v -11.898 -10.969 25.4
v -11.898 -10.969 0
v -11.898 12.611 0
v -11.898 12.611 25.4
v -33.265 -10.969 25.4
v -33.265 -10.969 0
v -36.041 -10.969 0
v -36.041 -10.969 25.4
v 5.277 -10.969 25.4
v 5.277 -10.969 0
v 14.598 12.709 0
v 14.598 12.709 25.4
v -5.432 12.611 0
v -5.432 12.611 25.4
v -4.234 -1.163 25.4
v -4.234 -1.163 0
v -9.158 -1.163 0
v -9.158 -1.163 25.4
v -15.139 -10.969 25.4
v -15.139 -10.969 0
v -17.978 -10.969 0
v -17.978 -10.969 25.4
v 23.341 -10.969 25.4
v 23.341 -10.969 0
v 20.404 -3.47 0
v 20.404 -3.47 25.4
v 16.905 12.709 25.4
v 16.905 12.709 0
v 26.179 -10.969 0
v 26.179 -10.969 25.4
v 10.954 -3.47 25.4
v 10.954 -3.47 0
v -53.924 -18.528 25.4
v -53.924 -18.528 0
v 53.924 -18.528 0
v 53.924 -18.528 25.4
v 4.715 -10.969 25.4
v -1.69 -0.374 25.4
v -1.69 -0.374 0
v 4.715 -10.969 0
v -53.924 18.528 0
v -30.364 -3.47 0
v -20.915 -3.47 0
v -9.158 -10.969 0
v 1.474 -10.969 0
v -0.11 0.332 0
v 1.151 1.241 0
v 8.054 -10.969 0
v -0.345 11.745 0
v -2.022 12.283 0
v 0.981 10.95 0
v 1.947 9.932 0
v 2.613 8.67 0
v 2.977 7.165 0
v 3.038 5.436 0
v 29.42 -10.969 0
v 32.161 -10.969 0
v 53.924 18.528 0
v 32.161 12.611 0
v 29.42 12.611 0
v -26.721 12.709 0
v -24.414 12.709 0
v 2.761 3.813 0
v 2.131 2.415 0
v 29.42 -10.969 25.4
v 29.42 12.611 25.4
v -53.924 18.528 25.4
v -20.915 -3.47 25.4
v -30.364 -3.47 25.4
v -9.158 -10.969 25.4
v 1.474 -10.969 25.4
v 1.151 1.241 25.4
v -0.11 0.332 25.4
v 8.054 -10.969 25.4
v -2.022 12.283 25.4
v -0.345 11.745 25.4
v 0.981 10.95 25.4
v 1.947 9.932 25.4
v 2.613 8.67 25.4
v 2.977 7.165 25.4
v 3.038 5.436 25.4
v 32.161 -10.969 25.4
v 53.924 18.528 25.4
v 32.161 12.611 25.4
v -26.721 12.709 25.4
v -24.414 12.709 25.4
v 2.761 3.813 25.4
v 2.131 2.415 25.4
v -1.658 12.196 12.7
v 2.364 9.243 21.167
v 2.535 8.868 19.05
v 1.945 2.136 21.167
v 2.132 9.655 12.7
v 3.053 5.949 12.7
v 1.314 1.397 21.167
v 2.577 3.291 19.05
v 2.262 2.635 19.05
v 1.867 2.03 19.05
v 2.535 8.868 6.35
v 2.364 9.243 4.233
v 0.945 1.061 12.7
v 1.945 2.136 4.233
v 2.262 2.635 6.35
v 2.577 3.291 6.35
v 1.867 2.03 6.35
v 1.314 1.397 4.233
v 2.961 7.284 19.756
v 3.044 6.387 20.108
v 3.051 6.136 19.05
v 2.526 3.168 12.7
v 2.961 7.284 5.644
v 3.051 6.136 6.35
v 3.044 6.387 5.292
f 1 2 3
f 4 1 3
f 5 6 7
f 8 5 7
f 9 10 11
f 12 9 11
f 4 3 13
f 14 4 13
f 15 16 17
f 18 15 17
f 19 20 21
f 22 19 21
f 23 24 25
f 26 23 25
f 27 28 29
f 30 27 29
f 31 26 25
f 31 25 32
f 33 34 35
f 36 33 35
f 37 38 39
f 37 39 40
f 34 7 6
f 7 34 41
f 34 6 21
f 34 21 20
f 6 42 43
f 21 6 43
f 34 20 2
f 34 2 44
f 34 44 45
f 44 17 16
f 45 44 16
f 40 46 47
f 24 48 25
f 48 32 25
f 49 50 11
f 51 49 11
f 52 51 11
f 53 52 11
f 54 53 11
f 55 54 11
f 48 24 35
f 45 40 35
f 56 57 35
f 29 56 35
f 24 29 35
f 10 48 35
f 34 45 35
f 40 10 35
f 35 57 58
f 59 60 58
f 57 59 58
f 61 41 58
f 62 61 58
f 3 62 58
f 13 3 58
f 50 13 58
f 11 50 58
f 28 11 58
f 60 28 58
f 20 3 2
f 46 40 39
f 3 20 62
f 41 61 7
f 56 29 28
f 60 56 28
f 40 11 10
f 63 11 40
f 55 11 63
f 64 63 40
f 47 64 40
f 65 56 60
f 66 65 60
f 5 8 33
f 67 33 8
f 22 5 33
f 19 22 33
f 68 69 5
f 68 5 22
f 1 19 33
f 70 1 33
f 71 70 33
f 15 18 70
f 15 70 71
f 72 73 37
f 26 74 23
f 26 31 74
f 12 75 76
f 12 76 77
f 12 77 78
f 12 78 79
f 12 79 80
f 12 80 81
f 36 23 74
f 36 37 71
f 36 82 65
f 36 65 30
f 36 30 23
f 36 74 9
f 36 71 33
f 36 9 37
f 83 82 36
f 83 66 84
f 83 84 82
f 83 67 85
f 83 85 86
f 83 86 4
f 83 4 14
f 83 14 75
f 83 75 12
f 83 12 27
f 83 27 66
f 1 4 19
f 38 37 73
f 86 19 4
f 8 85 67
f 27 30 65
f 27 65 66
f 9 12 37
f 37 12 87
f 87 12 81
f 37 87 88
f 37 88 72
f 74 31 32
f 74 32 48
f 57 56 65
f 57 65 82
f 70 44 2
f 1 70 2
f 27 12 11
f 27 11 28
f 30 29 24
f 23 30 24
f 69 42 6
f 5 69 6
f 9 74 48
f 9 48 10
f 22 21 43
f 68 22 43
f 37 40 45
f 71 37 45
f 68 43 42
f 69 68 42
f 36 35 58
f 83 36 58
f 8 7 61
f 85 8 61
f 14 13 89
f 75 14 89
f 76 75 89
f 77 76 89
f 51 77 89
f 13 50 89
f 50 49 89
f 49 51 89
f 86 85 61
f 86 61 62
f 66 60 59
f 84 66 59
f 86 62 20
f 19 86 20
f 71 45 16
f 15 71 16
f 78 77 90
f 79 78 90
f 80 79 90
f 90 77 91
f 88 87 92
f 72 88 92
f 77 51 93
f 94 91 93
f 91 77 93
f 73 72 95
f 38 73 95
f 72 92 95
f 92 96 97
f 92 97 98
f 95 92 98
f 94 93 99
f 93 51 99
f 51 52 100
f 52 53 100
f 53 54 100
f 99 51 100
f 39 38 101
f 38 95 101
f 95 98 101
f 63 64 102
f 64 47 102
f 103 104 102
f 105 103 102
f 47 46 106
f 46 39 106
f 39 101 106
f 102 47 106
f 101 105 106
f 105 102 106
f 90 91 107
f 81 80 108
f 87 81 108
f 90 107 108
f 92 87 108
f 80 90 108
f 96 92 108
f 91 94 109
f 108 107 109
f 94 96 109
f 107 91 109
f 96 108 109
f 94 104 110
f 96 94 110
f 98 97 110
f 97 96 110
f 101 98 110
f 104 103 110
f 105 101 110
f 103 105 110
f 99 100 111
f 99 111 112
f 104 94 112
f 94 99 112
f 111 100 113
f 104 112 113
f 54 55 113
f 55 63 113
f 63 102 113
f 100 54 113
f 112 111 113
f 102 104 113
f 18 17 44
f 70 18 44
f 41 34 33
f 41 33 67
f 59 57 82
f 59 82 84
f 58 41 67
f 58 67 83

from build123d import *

# Parameters (mm, degrees)
F0_W     = 107.8475788236
F0_H     = 37.0553210378
F0_W_2   = 2.7404779285
F0_H_2   = 23.5804965256
F1_DEPTH = 25.4


with BuildPart() as f1:
    # F0 (on Top) → F1 (new body)
    with BuildSketch(Plane.XY):
        Rectangle(F0_W, F0_H)
        Polygon((-15.1394193599, -10.96911286), (-17.9779558206, -10.96911286), (-20.9145508137, -3.4702156283), (-30.3642967402, -3.4702156283), (-33.2647649056, -10.96911286), (-36.0413696617, -10.96911286), (-26.7206481197, 12.7094421979), (-24.4136921234, 12.7094421979), align=None, mode=Mode.SUBTRACT)
        with BuildLine():
            Line((-4.2342783753, -1.163259632), (-9.1578488908, -1.163259632))
            Line((-9.1578488908, -1.163259632), (-9.1578488908, -10.96911286))
            Line((-9.1578488908, -10.96911286), (-11.8983268193, -10.96911286))
            Line((-11.8983268193, -10.96911286), (-11.8983268193, 12.6113836656))
            Line((-11.8983268193, 12.6113836656), (-5.4316246642, 12.6113836656))
            add(Edge.make_bspline(
                [(-5.4316246642, 12.6113836656), (-1.091244367, 12.6113836656), (0.9808872494, 10.9495495922)],
                knots=[0, 0, 0, 1, 1, 1], degree=2))
            add(Edge.make_bspline(
                [(0.9808872494, 10.9495495922), (3.0530188657, 9.2877155188), (3.0530188657, 5.9485644459)],
                knots=[0, 0, 0, 1, 1, 1], degree=2))
            add(Edge.make_bspline(
                [(3.0530188657, 5.9485644459), (3.0530188657, 1.2727207488), (-1.6899175114, -0.3736303984)],
                knots=[0, 0, 0, 1, 1, 1], degree=2))
            Line((-1.6899175114, -0.3736303984), (4.7148529391, -10.96911286))
            Line((4.7148529391, -10.96911286), (1.4737603985, -10.96911286))
            Line((1.4737603985, -10.96911286), (-4.2342783753, -1.163259632))
        make_face(mode=Mode.SUBTRACT)
        Polygon((26.1793495576, -10.96911286), (23.3408130969, -10.96911286), (20.4042181039, -3.4702156283), (10.9544721773, -3.4702156283), (8.054004012, -10.96911286), (5.2773992558, -10.96911286), (14.5981207978, 12.7094421979), (16.9050767941, 12.7094421979), align=None, mode=Mode.SUBTRACT)
        with Locations((30.7906810625, 0.8211354028)):
            Rectangle(F0_W_2, F0_H_2, mode=Mode.SUBTRACT)
    extrude(amount=F1_DEPTH)


solid = f1.part
